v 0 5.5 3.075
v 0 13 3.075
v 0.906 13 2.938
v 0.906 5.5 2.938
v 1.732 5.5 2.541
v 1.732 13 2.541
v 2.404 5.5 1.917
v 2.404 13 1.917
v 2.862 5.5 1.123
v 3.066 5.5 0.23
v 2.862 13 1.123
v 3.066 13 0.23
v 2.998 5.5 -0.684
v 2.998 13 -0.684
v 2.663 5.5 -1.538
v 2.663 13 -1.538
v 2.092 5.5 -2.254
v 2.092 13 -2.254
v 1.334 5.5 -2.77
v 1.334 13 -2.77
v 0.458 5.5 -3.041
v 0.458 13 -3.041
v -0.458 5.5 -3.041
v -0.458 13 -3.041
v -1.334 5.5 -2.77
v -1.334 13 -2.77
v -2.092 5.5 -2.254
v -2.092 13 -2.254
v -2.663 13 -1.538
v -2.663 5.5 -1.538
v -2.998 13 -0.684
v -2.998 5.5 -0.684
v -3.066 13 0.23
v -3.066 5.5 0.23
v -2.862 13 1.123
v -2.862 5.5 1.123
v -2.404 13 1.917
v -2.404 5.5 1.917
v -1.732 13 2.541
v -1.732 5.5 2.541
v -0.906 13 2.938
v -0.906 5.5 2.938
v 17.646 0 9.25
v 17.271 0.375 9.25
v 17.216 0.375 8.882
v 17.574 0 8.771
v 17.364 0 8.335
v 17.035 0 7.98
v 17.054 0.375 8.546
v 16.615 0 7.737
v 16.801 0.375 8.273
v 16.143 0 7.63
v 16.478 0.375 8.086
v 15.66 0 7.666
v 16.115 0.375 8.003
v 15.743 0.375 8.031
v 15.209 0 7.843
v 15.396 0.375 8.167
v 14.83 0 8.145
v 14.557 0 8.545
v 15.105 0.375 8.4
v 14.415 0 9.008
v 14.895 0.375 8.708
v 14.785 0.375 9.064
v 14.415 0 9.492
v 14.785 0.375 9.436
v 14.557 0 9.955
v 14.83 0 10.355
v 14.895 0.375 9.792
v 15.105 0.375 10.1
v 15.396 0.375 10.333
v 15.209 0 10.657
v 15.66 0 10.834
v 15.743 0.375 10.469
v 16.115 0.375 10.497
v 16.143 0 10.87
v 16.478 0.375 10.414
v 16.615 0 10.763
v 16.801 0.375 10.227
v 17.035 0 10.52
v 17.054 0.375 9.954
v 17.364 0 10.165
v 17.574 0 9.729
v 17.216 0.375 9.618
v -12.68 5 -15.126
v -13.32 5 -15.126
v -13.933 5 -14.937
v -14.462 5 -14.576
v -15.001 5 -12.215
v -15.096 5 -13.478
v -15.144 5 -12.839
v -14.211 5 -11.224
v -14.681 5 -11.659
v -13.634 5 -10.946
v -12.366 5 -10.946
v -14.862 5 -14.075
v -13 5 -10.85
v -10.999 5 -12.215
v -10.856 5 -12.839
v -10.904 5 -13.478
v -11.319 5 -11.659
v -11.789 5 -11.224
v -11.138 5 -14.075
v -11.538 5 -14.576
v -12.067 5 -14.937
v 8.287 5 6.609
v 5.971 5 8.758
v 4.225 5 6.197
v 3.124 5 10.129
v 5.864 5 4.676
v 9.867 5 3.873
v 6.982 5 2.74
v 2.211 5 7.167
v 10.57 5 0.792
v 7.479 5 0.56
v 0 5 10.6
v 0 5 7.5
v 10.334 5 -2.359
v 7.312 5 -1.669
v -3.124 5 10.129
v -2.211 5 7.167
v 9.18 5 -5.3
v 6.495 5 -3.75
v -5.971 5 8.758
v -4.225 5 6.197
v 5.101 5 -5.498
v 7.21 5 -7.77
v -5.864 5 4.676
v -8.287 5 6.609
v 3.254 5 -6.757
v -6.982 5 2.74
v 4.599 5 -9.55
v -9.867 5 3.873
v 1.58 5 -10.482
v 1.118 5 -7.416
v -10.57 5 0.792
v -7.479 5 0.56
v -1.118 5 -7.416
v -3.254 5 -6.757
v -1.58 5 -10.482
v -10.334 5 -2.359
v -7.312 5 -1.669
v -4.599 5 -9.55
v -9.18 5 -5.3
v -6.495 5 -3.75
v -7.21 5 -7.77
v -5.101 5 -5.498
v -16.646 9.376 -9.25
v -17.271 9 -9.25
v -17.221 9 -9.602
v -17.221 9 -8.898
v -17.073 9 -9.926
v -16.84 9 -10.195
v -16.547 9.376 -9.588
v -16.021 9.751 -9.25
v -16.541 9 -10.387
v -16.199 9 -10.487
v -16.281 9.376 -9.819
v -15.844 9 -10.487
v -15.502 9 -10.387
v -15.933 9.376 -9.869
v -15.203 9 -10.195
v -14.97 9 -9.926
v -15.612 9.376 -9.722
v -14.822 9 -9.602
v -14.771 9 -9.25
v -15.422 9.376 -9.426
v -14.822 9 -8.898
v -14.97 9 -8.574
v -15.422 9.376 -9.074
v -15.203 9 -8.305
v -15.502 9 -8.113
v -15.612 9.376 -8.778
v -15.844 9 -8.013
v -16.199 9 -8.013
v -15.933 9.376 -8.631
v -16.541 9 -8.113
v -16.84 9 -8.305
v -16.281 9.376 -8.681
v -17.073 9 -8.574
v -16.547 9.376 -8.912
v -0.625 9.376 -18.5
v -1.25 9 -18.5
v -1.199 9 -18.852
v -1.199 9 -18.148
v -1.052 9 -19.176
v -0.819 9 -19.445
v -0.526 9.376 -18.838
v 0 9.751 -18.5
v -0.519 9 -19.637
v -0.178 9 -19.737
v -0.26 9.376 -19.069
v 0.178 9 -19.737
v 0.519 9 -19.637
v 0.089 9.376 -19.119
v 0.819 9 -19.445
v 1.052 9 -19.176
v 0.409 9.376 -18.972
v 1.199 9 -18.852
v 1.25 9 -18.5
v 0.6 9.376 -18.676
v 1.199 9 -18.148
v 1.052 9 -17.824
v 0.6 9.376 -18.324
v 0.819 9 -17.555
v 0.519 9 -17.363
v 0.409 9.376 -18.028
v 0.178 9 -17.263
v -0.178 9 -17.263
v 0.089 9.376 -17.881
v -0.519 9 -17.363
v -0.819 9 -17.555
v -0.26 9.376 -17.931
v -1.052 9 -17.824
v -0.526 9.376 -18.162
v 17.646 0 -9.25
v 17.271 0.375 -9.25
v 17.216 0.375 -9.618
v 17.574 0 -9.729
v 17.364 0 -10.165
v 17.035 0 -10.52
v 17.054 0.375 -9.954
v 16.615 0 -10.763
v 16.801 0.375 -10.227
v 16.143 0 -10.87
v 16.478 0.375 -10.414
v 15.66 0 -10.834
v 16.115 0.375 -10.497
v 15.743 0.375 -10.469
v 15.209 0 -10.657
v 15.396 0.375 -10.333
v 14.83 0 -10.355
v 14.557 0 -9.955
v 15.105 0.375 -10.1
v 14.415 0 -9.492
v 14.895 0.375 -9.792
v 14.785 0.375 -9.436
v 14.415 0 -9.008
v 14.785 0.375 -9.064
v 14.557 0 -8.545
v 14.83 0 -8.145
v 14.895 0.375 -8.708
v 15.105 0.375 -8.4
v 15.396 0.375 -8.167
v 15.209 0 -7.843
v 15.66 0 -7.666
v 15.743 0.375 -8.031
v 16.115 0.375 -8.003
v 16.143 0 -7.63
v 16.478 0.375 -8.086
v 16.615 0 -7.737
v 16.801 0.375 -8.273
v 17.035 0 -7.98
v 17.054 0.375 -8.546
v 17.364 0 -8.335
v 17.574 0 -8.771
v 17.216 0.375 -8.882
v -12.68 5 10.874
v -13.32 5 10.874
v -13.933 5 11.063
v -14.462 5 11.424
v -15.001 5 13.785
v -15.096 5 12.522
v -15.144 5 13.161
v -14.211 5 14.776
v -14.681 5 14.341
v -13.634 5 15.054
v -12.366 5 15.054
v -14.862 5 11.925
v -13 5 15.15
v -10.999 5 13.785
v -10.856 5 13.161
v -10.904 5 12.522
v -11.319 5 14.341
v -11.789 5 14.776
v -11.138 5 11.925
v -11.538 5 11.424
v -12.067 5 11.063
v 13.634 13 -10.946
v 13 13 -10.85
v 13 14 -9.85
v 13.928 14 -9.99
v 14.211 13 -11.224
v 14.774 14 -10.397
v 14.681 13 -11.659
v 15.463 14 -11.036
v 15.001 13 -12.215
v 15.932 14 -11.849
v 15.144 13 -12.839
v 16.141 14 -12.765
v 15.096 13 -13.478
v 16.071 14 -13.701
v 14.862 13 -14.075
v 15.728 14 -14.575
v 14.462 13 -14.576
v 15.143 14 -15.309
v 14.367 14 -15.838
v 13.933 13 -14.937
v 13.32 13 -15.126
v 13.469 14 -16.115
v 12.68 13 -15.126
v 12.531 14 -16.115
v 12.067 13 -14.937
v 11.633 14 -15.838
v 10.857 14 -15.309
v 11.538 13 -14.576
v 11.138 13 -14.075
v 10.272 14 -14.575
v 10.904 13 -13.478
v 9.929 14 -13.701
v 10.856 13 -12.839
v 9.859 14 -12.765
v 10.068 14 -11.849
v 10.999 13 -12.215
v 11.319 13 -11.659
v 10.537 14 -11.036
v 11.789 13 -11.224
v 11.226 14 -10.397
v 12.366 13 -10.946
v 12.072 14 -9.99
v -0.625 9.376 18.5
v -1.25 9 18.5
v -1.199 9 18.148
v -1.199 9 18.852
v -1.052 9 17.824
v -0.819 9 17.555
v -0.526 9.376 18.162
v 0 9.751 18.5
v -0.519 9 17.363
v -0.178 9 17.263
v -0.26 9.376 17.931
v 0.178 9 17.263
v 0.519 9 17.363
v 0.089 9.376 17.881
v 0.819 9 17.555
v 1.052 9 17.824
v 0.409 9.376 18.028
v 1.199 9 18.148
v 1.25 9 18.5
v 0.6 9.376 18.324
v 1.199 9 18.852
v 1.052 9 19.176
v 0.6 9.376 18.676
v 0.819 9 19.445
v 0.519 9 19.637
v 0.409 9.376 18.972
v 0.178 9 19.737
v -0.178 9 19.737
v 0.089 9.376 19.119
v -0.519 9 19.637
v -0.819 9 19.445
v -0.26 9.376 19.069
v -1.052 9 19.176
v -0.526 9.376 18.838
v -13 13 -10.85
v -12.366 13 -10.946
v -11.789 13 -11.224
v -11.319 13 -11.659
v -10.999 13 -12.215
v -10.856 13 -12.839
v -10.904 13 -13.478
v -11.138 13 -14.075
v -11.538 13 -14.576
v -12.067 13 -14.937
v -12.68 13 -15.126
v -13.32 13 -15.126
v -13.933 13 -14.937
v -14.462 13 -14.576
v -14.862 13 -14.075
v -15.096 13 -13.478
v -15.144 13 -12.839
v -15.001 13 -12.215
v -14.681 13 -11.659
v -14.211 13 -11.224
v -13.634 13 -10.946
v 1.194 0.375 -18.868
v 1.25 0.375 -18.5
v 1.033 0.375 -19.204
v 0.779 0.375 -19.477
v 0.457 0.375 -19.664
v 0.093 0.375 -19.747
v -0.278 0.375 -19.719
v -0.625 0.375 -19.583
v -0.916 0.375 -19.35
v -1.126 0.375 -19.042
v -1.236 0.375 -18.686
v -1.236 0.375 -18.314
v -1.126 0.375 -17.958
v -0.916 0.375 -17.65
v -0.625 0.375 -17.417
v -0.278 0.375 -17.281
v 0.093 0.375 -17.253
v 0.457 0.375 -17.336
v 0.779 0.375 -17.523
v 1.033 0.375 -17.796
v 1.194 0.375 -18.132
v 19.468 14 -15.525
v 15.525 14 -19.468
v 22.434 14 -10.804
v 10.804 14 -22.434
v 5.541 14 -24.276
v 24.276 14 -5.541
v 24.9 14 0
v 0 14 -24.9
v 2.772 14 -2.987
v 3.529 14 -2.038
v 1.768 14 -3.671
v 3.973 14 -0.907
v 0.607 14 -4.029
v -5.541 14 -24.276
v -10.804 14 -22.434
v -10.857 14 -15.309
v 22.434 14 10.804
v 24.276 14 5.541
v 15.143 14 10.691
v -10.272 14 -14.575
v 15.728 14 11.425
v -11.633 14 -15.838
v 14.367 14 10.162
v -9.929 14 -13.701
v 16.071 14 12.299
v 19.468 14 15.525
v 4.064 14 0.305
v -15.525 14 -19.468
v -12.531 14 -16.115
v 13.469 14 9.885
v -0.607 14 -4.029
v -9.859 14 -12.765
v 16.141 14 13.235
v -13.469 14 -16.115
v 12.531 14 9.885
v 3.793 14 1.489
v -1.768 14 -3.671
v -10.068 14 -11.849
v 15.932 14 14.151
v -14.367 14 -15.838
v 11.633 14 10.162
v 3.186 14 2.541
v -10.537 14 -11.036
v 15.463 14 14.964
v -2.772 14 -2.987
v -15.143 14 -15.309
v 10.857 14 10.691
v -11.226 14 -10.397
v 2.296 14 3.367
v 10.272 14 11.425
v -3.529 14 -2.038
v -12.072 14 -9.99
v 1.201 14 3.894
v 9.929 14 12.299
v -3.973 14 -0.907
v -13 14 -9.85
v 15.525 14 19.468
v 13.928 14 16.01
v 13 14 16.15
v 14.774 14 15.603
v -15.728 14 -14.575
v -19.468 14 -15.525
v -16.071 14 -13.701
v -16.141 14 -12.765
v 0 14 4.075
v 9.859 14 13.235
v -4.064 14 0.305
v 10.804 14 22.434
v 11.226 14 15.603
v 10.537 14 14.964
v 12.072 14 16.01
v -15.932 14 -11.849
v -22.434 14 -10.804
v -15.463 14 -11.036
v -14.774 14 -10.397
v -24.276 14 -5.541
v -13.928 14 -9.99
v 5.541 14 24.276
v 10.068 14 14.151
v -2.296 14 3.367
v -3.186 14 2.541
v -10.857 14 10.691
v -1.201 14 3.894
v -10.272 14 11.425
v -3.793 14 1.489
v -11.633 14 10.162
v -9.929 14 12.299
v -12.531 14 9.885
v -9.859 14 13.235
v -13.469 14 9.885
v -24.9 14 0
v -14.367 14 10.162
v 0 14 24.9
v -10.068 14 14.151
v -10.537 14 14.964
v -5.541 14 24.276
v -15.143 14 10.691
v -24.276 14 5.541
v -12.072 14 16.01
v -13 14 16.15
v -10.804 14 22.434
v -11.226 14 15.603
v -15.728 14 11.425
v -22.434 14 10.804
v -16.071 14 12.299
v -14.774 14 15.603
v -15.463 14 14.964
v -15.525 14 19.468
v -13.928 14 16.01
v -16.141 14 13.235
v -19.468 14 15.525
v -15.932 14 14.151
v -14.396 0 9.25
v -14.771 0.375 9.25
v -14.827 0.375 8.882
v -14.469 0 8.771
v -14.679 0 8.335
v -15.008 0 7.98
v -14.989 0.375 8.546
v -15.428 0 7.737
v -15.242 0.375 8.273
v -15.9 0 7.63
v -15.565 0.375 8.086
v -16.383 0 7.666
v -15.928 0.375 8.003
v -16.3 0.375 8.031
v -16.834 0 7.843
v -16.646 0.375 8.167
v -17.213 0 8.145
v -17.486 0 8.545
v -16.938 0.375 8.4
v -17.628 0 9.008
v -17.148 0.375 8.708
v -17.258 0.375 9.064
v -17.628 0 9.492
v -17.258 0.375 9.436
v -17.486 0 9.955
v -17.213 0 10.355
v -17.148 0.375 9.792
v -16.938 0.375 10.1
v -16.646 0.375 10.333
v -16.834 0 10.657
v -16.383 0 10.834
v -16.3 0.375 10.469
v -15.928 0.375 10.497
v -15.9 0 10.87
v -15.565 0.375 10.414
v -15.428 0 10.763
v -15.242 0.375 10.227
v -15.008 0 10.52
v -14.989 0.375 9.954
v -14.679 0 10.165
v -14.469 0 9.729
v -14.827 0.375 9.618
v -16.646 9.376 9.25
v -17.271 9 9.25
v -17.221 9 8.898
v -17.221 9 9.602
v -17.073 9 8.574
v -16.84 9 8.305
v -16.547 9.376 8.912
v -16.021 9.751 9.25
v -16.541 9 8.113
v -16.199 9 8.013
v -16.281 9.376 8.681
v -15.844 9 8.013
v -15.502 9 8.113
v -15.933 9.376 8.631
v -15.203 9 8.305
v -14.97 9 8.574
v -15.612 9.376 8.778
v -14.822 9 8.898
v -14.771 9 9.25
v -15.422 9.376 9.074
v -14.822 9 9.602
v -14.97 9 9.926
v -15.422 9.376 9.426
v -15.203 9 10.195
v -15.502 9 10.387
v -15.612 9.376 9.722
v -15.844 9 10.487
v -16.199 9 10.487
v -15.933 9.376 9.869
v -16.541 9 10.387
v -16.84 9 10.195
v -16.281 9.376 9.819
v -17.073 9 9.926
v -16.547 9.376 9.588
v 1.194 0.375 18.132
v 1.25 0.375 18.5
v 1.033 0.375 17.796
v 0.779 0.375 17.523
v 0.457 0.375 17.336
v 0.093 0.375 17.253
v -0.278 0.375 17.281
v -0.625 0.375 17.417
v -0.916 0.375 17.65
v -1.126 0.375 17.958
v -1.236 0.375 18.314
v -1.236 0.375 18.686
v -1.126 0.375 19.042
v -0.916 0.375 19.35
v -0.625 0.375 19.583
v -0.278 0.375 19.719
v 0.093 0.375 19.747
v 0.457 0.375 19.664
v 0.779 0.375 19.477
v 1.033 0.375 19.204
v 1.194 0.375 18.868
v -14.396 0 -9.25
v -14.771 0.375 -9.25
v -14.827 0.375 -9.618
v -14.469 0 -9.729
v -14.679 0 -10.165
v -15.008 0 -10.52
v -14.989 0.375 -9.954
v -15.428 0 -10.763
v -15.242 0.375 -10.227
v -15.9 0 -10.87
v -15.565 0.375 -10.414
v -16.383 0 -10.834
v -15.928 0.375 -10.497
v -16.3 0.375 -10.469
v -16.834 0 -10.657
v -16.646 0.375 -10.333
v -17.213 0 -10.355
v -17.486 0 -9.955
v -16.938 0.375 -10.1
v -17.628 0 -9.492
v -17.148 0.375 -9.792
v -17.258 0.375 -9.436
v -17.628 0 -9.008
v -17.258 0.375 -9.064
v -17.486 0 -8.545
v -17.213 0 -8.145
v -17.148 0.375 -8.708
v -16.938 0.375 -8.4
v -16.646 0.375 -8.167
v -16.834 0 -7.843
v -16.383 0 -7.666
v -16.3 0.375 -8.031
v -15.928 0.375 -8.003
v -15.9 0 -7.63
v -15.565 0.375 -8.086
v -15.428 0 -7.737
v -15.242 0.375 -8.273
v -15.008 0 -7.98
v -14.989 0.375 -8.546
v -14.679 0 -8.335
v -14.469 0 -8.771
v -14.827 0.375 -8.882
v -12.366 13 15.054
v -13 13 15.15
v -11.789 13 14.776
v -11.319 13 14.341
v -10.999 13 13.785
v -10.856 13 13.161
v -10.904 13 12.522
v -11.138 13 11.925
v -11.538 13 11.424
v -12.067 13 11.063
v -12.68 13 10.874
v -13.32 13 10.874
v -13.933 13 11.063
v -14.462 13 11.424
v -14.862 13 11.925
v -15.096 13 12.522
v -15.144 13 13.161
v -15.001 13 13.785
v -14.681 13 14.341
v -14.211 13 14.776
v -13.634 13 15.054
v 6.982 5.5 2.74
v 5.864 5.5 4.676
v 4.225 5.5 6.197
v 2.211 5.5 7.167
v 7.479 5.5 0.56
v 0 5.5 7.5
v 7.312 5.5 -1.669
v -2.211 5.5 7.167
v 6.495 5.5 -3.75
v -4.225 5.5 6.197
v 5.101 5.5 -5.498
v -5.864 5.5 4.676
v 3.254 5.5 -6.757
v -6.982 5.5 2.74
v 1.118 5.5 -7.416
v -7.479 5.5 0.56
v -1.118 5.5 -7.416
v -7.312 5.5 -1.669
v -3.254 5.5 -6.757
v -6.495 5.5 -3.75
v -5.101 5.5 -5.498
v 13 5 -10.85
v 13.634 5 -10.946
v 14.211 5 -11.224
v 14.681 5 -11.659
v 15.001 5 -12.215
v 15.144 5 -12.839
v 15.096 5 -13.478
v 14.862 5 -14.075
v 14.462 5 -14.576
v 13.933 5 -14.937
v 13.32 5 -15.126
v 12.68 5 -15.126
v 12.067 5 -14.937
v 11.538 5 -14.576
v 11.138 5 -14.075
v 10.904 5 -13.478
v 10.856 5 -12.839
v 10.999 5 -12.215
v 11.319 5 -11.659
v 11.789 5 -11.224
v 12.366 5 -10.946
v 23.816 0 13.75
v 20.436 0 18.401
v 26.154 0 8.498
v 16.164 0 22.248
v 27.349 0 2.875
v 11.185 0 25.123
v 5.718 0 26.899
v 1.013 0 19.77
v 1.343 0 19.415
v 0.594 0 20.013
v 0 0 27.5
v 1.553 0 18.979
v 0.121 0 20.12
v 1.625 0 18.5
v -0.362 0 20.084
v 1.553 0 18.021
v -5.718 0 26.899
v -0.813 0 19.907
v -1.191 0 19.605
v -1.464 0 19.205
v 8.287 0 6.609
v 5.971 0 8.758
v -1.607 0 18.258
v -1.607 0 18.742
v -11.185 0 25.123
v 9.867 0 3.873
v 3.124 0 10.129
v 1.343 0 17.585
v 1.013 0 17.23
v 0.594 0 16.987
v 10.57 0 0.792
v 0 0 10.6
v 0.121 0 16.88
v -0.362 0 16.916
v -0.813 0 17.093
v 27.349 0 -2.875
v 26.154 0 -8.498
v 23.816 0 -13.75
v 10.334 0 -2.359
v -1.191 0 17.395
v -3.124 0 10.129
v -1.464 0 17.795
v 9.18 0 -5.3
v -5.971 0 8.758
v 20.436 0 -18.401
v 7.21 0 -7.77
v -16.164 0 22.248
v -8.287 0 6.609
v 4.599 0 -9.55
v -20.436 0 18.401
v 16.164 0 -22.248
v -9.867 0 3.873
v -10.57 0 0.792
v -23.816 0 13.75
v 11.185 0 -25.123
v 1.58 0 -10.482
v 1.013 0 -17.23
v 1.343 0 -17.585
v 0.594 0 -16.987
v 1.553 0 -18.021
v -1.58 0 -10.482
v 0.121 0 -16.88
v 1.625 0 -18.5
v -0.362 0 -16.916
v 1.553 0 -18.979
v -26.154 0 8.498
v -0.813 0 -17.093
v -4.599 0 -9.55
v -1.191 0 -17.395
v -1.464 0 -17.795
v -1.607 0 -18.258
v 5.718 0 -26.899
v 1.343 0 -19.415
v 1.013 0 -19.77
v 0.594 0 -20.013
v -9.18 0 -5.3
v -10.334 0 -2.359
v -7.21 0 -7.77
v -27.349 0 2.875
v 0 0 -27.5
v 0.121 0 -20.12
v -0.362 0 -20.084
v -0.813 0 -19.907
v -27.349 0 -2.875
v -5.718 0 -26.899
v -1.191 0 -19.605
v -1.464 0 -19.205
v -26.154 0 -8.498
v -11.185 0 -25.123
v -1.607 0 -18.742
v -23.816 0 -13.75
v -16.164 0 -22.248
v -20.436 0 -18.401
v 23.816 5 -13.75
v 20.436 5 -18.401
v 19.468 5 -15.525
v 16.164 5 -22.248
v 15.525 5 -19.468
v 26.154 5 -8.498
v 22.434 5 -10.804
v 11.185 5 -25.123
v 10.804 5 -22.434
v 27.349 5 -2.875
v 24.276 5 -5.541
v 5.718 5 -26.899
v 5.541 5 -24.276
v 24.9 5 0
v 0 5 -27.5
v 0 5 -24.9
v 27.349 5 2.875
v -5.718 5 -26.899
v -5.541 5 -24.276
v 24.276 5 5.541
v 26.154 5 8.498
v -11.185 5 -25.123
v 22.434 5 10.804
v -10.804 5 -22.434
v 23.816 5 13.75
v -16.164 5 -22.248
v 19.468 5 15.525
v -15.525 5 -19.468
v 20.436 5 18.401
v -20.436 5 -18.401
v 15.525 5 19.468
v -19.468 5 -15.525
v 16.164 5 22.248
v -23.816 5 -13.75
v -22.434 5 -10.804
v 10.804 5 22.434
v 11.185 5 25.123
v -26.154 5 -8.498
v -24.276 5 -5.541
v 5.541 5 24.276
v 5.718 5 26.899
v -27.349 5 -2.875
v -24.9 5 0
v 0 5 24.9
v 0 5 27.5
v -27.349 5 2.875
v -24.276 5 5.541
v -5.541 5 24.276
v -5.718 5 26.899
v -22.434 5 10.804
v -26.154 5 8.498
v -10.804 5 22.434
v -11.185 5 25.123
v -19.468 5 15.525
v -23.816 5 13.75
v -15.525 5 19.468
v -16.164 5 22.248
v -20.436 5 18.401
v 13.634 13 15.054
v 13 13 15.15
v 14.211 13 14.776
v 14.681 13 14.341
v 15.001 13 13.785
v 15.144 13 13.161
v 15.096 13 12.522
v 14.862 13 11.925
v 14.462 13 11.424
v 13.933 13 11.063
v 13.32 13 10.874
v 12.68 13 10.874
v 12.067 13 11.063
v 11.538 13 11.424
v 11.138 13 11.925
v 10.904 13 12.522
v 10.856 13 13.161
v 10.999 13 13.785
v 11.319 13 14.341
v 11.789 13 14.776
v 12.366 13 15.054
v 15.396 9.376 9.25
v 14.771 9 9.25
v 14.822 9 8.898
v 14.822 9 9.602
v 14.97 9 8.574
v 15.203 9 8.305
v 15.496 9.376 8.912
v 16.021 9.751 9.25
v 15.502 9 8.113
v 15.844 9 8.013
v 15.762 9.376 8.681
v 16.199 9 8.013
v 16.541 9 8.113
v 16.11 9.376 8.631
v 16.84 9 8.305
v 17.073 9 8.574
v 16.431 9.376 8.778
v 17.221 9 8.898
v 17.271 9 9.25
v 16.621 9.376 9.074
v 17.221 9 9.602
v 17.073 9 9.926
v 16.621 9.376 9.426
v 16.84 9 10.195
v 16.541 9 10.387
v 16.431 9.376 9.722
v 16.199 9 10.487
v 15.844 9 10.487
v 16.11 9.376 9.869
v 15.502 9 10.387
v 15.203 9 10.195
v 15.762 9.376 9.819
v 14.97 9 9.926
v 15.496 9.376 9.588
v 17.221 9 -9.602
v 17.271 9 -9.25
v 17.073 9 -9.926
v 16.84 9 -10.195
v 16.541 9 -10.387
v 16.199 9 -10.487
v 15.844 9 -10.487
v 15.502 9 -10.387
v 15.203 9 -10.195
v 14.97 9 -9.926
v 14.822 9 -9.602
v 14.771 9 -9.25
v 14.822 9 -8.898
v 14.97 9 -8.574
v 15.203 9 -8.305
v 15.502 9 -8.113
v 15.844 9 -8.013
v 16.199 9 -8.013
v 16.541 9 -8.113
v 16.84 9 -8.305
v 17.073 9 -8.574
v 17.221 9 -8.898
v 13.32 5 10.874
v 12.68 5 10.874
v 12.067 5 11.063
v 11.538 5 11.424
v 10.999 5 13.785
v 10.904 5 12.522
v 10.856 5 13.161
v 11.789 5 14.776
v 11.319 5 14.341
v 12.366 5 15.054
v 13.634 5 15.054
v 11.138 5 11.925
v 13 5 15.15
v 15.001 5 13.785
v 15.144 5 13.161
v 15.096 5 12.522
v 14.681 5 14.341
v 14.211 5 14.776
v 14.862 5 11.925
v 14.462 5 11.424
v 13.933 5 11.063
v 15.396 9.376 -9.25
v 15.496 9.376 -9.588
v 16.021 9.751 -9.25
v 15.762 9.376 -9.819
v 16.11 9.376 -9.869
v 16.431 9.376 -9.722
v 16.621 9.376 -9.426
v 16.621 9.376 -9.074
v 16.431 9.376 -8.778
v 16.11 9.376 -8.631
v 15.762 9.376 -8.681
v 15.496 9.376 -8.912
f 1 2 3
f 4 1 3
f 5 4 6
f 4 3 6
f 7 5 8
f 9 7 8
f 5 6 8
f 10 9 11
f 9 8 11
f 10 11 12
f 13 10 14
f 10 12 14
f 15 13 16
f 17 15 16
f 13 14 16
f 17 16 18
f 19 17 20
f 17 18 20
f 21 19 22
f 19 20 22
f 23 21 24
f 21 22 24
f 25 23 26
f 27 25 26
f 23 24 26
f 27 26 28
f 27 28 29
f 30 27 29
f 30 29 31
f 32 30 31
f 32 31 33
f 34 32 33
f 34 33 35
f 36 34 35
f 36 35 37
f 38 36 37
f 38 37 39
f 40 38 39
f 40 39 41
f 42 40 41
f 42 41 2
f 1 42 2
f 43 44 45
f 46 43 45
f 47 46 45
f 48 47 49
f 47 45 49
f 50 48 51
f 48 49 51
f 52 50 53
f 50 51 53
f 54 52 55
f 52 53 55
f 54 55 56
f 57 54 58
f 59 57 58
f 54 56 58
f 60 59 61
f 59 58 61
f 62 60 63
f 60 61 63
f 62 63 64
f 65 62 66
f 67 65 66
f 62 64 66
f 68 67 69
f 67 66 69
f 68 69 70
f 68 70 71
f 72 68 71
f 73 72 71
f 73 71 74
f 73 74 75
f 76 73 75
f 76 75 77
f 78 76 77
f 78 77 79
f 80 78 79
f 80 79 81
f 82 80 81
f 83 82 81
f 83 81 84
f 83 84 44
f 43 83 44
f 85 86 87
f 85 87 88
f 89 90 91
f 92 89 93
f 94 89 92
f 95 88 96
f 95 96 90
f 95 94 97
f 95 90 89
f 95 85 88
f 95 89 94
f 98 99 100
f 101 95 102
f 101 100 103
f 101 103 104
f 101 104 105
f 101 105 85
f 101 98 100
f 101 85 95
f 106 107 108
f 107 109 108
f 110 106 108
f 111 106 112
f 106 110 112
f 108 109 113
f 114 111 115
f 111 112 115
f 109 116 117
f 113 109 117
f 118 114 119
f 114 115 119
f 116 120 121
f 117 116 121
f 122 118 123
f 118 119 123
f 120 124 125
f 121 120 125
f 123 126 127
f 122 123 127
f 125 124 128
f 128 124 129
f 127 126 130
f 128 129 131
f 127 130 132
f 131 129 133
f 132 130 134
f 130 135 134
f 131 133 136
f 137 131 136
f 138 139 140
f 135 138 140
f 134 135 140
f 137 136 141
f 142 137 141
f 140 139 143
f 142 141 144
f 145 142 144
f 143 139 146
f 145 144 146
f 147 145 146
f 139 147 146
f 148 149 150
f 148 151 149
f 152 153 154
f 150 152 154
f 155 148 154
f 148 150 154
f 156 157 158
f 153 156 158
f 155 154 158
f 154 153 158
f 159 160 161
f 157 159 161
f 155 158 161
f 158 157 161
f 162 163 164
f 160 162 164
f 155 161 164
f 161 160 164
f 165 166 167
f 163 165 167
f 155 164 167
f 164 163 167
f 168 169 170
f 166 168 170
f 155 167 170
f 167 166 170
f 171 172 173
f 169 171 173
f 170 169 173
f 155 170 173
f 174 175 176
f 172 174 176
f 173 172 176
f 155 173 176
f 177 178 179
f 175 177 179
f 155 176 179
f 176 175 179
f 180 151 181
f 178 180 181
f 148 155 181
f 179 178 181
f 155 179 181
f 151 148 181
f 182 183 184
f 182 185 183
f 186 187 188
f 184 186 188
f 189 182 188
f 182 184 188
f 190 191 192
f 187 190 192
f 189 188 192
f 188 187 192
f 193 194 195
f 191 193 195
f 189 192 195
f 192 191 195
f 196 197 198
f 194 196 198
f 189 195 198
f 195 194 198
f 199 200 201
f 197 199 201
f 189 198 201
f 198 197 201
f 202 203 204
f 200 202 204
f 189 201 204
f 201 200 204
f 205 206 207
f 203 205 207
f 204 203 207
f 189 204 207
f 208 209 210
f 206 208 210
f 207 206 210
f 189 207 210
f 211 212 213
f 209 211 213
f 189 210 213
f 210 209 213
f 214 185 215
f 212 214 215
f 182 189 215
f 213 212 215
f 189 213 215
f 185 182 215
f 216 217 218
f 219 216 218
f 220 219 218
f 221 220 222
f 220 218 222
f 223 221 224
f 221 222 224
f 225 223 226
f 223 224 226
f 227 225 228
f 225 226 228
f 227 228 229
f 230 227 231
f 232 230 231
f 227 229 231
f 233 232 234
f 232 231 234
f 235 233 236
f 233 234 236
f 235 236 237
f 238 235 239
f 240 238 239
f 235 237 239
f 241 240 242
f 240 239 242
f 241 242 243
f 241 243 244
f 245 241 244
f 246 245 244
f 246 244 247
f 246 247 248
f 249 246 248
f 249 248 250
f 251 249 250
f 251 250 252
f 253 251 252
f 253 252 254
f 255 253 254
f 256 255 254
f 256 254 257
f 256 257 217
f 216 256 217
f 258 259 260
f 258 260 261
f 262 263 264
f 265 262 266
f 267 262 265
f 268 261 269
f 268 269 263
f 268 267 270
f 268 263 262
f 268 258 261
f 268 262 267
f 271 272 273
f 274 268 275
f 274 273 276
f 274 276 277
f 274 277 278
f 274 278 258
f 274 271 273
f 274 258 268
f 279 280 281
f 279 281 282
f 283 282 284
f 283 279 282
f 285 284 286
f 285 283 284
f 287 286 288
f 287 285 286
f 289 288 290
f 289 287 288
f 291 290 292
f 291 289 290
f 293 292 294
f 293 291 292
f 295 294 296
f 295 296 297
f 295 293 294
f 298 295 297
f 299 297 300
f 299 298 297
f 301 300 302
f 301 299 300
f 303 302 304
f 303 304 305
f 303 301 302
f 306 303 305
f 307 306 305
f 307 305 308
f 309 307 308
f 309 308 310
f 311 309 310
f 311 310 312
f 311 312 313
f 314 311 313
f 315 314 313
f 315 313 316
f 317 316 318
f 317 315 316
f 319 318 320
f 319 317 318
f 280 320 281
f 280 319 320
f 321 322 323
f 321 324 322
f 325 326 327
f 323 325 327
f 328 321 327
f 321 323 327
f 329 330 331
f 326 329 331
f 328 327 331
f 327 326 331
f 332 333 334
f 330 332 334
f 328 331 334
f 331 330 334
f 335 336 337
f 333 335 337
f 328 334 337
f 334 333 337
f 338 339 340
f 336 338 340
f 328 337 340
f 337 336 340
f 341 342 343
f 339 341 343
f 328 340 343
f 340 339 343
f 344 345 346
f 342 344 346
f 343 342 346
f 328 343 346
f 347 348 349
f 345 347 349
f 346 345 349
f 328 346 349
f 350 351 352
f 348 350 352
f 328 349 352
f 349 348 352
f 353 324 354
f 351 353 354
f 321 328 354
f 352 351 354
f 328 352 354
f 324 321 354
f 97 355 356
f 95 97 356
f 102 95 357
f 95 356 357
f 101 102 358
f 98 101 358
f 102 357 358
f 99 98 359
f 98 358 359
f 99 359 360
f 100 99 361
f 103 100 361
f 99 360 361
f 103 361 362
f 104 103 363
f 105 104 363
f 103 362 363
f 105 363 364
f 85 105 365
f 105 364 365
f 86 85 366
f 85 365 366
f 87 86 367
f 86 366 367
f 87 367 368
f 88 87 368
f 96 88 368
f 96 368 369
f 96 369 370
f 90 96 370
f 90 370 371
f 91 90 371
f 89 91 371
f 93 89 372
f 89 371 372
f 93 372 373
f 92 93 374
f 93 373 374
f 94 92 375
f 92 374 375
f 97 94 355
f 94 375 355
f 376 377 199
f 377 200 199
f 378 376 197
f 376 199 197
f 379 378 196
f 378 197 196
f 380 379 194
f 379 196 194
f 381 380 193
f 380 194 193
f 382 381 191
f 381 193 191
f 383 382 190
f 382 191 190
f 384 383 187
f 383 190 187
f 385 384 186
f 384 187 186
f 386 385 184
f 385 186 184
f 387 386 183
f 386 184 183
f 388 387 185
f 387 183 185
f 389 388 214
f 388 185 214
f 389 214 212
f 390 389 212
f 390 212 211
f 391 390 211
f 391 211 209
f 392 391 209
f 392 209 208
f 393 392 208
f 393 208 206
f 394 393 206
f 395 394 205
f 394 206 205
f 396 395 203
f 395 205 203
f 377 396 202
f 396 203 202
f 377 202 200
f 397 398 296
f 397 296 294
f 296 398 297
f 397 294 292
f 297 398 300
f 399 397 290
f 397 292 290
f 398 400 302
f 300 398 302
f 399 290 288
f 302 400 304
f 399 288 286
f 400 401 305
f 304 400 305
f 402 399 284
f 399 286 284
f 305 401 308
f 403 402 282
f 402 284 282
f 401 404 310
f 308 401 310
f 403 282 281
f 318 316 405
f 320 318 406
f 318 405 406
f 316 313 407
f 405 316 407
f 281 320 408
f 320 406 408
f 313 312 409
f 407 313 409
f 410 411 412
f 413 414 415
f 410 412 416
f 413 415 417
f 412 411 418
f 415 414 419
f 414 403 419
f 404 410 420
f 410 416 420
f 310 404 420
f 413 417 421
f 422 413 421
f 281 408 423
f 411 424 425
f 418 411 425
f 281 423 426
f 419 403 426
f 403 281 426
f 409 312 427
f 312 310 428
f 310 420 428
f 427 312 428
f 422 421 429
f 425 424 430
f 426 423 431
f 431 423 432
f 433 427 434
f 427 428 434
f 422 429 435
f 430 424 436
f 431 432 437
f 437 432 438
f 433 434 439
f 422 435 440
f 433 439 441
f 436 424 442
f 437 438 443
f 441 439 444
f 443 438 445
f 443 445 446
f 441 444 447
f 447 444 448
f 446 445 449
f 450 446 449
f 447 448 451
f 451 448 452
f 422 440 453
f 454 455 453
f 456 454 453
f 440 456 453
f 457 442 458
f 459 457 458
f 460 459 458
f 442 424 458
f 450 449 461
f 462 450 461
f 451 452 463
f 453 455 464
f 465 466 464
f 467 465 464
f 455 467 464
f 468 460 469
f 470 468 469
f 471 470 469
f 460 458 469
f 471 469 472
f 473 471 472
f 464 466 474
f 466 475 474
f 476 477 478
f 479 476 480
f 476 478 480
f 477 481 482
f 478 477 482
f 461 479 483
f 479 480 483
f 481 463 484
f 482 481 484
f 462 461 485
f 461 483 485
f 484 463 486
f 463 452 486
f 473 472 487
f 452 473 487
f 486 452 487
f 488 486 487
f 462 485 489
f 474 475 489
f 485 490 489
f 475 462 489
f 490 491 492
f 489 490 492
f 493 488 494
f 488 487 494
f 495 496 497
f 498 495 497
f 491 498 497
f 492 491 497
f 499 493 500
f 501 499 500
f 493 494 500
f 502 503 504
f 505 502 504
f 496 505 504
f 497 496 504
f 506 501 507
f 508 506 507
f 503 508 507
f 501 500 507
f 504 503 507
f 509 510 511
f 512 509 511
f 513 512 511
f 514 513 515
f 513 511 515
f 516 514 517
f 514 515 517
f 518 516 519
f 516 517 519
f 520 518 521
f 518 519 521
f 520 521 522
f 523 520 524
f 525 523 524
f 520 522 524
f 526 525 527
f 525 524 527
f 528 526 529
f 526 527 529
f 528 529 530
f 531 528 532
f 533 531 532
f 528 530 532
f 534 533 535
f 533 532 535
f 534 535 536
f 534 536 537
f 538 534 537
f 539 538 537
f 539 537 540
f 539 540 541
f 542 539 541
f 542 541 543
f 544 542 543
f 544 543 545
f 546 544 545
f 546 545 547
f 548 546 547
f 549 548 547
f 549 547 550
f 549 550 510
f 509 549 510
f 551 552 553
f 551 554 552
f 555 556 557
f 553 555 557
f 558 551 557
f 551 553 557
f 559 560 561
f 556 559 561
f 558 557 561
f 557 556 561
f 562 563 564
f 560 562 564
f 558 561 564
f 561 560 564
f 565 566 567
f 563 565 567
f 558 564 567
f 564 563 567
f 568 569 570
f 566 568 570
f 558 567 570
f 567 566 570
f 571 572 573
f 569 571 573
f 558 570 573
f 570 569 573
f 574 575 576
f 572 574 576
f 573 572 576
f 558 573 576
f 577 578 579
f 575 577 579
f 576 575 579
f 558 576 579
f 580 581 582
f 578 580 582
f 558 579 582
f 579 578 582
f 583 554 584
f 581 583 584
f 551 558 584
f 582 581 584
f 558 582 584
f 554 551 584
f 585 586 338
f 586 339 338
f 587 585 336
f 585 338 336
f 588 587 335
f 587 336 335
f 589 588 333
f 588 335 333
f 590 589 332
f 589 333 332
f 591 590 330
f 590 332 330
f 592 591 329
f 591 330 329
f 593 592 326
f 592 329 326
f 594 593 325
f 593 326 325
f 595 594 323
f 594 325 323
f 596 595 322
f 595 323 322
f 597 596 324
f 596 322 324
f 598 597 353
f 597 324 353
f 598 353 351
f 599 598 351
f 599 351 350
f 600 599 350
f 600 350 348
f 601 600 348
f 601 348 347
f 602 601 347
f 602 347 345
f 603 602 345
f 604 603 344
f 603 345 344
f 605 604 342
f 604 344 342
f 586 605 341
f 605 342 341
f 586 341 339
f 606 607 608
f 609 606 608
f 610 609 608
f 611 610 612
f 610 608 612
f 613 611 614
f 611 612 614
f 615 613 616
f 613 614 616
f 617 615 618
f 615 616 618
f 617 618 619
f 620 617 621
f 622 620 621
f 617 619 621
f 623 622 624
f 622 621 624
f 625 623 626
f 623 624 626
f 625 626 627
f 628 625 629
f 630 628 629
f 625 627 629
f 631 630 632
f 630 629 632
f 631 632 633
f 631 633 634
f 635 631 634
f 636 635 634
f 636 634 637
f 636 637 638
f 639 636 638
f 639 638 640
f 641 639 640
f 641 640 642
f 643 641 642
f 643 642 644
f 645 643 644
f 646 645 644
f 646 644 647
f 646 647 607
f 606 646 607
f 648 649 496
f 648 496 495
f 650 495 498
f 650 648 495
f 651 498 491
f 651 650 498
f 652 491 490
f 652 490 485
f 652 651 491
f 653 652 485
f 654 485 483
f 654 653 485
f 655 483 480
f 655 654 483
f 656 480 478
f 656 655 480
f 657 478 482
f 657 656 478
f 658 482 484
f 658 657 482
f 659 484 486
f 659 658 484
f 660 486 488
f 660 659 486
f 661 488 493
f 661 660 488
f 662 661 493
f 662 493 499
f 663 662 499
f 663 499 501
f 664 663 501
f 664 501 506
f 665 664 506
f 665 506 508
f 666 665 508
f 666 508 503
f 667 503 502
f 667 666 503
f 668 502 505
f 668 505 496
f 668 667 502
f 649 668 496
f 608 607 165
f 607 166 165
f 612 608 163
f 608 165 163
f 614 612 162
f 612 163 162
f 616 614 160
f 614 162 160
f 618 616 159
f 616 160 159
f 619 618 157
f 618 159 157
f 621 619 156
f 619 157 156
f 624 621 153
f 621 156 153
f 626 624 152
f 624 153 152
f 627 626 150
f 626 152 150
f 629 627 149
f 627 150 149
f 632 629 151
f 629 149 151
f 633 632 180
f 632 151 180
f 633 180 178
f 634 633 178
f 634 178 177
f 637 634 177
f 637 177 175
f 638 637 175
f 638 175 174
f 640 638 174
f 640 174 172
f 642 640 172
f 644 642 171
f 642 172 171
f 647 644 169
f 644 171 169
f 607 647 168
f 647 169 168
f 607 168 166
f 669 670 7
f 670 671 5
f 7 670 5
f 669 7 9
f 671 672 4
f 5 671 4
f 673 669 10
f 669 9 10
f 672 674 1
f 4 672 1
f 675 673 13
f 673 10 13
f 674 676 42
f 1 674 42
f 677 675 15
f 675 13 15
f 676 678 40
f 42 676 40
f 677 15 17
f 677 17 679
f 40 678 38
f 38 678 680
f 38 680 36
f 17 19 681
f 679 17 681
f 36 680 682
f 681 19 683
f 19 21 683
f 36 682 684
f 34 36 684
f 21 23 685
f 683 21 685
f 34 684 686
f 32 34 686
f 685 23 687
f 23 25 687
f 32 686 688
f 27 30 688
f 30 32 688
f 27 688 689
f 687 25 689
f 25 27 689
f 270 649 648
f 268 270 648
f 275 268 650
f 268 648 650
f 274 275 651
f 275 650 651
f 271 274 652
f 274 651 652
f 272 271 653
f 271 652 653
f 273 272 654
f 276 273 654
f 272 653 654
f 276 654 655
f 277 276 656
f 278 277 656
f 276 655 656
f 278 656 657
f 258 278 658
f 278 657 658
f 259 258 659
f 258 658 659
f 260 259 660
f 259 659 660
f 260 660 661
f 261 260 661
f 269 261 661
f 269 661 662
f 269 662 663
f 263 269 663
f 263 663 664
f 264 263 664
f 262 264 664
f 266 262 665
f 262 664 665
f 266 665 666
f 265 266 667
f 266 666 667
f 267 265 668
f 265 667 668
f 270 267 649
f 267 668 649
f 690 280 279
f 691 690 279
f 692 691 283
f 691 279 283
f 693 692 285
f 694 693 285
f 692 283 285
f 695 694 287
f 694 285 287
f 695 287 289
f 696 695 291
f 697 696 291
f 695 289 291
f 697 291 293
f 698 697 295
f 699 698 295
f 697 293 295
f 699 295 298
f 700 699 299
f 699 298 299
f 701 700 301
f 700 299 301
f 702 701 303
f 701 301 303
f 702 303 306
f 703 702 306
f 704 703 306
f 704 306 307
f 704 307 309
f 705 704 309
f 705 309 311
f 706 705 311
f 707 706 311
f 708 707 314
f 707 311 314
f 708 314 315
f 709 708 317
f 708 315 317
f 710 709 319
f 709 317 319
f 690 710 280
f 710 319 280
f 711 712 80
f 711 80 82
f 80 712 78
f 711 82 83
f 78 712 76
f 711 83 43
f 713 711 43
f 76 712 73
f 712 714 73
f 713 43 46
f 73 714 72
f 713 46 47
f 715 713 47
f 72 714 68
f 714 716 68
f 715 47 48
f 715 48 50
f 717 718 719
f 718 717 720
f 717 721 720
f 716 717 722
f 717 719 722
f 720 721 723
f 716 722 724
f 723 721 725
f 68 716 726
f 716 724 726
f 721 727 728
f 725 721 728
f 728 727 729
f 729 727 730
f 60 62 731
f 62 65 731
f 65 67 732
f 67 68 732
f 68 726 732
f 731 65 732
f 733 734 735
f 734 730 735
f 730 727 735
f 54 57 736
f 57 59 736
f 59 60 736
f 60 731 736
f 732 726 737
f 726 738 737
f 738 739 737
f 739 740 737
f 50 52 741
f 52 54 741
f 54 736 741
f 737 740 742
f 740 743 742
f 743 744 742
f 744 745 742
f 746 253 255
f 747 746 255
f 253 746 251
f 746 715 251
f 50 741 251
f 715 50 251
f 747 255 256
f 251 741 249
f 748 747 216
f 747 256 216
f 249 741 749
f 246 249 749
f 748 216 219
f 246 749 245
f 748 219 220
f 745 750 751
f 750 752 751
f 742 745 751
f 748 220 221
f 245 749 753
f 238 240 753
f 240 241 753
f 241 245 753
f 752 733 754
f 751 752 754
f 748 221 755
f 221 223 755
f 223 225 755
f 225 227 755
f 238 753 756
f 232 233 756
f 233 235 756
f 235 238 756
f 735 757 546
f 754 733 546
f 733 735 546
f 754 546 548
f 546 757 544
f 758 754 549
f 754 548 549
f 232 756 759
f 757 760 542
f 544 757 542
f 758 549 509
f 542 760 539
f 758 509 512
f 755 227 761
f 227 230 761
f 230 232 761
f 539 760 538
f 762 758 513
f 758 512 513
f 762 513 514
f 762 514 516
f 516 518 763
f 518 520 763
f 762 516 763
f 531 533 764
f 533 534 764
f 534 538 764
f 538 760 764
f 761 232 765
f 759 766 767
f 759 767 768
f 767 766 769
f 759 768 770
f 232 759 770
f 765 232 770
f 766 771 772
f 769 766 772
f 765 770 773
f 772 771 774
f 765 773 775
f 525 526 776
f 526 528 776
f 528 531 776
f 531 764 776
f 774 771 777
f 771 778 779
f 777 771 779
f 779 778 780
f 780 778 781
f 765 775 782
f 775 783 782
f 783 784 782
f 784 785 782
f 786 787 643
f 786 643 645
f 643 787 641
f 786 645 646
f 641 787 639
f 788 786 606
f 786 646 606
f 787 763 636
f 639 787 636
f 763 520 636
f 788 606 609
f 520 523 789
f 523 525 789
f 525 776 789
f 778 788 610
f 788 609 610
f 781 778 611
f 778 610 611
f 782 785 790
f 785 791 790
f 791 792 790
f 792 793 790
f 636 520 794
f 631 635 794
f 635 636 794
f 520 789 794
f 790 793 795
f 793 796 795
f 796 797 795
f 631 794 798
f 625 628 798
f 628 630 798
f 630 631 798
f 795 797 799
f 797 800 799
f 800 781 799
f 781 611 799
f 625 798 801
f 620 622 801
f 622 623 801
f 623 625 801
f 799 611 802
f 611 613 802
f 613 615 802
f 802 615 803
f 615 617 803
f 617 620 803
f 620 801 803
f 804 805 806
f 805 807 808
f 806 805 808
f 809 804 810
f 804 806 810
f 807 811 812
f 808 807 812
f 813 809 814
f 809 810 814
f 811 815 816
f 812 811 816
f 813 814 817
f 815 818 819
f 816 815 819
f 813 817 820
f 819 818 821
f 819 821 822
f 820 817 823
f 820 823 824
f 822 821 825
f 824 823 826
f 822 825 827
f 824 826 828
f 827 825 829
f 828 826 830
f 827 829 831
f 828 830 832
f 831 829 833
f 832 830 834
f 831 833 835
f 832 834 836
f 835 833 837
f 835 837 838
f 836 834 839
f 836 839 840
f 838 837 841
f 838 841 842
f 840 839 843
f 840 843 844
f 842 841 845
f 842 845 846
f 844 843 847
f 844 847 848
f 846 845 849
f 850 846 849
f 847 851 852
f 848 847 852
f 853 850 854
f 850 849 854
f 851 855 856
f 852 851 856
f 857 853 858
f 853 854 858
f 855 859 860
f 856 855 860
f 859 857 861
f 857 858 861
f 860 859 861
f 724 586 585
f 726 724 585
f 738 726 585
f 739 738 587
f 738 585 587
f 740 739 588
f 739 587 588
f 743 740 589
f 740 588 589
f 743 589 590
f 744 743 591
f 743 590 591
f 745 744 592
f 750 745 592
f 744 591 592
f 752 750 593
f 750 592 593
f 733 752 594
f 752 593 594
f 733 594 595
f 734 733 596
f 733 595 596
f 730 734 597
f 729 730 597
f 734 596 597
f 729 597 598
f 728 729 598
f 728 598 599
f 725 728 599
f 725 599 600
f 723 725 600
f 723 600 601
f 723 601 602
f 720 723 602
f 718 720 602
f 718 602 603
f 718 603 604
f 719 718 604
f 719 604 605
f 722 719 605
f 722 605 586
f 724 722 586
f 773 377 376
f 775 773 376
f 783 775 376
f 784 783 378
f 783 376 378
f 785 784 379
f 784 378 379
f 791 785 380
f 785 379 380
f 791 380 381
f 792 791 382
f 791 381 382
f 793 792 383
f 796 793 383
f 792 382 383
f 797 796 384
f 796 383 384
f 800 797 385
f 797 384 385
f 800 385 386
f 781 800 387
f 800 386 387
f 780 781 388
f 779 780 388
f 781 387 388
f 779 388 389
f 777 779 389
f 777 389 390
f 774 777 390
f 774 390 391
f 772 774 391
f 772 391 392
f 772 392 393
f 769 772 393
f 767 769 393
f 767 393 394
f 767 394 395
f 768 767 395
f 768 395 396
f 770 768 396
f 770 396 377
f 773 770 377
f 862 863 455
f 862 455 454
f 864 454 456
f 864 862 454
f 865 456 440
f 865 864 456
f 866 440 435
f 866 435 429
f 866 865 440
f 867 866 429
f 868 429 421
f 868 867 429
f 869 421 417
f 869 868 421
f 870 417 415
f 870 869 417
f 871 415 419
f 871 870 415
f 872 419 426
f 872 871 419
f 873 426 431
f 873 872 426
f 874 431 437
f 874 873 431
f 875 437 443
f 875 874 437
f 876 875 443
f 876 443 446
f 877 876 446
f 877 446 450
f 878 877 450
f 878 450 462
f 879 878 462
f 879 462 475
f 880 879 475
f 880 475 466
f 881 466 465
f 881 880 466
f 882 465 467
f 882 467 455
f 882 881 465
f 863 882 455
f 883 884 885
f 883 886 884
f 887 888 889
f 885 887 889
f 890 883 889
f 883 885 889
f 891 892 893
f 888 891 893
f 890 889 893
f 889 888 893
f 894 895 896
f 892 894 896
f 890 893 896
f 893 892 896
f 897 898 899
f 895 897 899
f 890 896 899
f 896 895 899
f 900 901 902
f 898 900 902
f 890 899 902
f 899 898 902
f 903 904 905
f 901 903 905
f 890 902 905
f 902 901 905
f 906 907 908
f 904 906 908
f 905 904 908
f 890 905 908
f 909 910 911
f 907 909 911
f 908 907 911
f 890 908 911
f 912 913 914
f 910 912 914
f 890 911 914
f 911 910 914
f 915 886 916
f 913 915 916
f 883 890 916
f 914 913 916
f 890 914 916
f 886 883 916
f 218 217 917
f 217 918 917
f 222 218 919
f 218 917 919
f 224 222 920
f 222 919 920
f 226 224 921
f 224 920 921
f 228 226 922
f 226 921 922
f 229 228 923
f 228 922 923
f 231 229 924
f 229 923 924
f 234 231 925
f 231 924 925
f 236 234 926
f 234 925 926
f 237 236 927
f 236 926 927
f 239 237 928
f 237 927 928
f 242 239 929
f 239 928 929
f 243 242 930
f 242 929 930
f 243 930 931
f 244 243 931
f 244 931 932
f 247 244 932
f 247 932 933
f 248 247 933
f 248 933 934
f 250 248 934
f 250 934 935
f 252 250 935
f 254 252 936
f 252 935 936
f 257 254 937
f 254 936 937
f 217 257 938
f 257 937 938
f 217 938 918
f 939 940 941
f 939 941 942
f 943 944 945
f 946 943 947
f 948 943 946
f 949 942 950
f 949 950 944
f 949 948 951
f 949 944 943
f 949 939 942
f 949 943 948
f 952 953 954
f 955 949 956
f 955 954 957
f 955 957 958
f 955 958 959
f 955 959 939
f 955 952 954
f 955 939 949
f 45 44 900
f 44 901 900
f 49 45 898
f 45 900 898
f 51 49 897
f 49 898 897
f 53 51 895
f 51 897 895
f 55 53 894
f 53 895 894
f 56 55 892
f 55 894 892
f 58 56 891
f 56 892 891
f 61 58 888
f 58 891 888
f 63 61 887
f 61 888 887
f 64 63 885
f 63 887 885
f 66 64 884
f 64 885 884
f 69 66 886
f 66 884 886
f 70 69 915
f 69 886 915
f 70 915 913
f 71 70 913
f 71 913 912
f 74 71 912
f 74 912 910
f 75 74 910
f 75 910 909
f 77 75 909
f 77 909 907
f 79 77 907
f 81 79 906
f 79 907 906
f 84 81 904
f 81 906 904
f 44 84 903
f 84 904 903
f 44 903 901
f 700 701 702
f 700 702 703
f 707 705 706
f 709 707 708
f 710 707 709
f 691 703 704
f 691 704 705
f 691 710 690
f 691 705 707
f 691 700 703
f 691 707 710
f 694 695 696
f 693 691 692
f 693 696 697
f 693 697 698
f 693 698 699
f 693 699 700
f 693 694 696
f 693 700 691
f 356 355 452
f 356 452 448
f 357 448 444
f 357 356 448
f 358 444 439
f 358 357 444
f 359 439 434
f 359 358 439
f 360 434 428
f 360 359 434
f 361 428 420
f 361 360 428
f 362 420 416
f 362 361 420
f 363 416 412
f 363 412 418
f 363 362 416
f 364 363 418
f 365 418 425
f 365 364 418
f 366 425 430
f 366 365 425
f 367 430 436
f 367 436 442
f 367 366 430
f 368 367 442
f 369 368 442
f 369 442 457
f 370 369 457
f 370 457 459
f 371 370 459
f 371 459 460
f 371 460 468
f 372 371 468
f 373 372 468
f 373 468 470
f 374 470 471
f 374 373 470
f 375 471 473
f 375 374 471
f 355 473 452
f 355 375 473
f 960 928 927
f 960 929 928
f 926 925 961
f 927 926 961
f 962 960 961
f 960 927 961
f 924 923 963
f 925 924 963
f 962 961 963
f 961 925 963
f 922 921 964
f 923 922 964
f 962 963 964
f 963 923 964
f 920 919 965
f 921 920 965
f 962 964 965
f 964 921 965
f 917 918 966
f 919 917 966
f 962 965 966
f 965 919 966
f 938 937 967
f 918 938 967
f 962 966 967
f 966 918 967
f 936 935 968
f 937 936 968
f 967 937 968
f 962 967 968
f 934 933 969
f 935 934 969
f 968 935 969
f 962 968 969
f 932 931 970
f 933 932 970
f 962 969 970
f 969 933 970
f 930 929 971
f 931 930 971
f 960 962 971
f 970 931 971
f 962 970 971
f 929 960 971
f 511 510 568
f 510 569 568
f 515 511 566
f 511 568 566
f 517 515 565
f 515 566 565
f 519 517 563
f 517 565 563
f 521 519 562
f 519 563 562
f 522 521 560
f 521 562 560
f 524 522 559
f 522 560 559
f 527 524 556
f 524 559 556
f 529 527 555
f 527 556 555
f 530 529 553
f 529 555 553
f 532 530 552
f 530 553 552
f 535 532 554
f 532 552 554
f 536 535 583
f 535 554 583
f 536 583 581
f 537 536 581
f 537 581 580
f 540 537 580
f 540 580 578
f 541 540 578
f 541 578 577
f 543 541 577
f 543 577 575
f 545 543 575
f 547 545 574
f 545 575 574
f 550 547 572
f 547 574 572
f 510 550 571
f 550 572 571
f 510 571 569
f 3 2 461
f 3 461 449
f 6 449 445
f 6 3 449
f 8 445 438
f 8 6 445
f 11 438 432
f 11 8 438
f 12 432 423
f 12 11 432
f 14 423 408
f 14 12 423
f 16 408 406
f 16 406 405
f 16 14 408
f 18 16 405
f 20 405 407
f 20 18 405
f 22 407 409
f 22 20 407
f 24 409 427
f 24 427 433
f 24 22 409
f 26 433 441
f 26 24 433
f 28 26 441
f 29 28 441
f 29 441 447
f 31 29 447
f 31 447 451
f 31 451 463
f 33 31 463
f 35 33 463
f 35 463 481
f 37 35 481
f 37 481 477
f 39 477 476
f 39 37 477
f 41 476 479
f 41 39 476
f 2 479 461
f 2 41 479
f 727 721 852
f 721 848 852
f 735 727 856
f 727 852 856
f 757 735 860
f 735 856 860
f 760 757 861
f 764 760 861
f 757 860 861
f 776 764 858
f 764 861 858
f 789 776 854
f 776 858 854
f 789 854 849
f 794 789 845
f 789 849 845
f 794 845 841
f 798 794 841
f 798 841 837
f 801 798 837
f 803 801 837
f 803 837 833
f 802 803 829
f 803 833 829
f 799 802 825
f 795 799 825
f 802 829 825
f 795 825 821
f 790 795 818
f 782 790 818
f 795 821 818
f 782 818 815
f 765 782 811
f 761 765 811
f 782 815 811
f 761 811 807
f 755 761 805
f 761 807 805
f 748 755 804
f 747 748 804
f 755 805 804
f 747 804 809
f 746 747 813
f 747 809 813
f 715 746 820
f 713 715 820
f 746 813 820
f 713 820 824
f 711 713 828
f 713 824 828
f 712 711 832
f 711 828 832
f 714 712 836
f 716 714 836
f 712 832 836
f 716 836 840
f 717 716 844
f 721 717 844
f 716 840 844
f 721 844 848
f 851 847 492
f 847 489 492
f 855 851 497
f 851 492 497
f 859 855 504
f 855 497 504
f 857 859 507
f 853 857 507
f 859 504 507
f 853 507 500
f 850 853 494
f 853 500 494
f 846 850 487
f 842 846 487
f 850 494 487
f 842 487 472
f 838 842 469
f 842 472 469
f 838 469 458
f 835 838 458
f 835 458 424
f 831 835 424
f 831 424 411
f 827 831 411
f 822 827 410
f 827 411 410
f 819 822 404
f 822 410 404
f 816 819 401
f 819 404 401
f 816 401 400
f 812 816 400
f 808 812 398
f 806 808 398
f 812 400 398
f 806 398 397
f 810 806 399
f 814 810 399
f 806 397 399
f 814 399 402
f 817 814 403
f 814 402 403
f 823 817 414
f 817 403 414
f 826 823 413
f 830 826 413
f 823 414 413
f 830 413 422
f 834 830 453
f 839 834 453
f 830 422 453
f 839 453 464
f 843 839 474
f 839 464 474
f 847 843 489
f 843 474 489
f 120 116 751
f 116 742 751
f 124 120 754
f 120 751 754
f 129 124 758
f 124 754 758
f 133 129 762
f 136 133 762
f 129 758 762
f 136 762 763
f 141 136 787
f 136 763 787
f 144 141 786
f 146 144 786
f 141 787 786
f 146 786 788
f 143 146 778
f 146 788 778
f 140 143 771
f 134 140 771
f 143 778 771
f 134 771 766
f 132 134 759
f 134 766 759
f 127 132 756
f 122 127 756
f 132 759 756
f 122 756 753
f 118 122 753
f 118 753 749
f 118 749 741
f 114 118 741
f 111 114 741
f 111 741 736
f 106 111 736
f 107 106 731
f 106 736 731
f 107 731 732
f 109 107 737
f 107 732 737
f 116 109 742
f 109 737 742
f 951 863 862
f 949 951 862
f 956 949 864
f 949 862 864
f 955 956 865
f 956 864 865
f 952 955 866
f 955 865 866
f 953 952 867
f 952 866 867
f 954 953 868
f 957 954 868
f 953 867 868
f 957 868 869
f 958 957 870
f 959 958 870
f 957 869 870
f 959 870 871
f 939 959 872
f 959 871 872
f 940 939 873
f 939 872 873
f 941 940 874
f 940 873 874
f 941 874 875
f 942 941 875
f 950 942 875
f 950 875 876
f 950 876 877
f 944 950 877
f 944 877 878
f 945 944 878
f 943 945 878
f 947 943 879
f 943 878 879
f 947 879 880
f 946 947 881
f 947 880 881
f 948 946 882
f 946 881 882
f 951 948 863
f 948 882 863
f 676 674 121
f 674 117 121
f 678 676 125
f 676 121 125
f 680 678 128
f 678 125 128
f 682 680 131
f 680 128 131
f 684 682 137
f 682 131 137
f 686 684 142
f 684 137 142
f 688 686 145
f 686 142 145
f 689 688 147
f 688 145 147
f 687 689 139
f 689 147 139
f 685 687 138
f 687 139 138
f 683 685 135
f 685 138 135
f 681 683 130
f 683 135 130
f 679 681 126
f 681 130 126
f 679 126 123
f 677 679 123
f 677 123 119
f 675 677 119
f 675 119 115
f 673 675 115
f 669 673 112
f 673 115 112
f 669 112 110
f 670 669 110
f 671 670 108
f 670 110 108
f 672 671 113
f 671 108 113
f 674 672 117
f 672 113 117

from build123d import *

# Parameters (mm, degrees)
F_2_5_2_5_DURCHMESSER_BOHRUNG1_D           = 2.5
F_2_5_2_5_DURCHMESSER_BOHRUNG1_DEPTH       = 9
F_2_5_2_5_DURCHMESSER_BOHRUNG1_CSINK_D     = 3.25
F_2_5_2_5_DURCHMESSER_BOHRUNG1_CSINK_ANGLE = 90
F_2_5_2_5_DURCHMESSER_BOHRUNG1_TIP         = 0.751075774
SKIZZE5_R                                  = 3.075
SKIZZE5_R_2                                = 2.15
SCHNITT_LINEAR_AUSTRAGEN1_DEPTH            = 9
FASE1_SIZE                                 = 1


with BuildPart() as part:
    # Skizze1 → Rotation1 (revolve)
    with BuildSketch(Plane.XY, mode=Mode.PRIVATE) as rotation1_sk:
        Polygon((10.6, 0), (27.5, 0), (27.5, 5), (24.9, 5), (24.9, 14), (0, 14), (0, 5.5), (7.5, 5.5), (7.5, 5), (10.6, 5), align=None)
    revolve(rotation1_sk.sketch.rotate(Axis((0, 0, 0), (0, -1, 0)), 90), axis=Axis((0, 0, 0), (0, -1, 0)))

    # Ø2.5 (2.5) Durchmesser Bohrung1
    with Locations(Plane(origin=(0, 0, 0), x_dir=(-1, 0, 0), z_dir=(0, -1, 0))):
        with Locations((-16.02146997, 9.25), (0, 18.5), (16.02146997, 9.25), (16.02146997, -9.25), (0, -18.5), (-16.02146997, -9.25)):
            CounterSinkHole(F_2_5_2_5_DURCHMESSER_BOHRUNG1_D / 2, F_2_5_2_5_DURCHMESSER_BOHRUNG1_CSINK_D / 2, depth=F_2_5_2_5_DURCHMESSER_BOHRUNG1_DEPTH, counter_sink_angle=F_2_5_2_5_DURCHMESSER_BOHRUNG1_CSINK_ANGLE)
            with Locations((0, 0, -(F_2_5_2_5_DURCHMESSER_BOHRUNG1_DEPTH + F_2_5_2_5_DURCHMESSER_BOHRUNG1_TIP / 2))):  # 118° drill point
                Cone(0, F_2_5_2_5_DURCHMESSER_BOHRUNG1_D / 2, F_2_5_2_5_DURCHMESSER_BOHRUNG1_TIP, mode=Mode.SUBTRACT)

    # Skizze5 → Schnitt-Linear austragen1 (cut)
    with BuildSketch(Plane(origin=(0, 14, 0), x_dir=(1, 0, 0), z_dir=(0, 1, 0))):
        with Locations(Location((0, 0, 0), (0, 0, 270))):
            Circle(SKIZZE5_R)
        with Locations(Location((13, 13, 0), (0, 0, 270))):
            Circle(SKIZZE5_R_2)
        with Locations(Location((13, -13, 0), (0, 0, 270))):
            Circle(SKIZZE5_R_2)
        with Locations(Location((-13, -13, 0), (0, 0, 270))):
            Circle(SKIZZE5_R_2)
        with Locations(Location((-13, 13, 0), (0, 0, 270))):
            Circle(SKIZZE5_R_2)
    extrude(amount=-SCHNITT_LINEAR_AUSTRAGEN1_DEPTH, mode=Mode.SUBTRACT)

    # Fase1
    fase1_edges = [part.edges().sort_by_distance(p)[0] for p in [
        (-13, 14, -15.15),
        (-13, 14, 10.85),
        (13, 14, 10.85),
        (13, 14, -15.15),
        (0, 14, -3.075),
    ]]
    chamfer(fase1_edges, length=FASE1_SIZE)


solid = part.part
